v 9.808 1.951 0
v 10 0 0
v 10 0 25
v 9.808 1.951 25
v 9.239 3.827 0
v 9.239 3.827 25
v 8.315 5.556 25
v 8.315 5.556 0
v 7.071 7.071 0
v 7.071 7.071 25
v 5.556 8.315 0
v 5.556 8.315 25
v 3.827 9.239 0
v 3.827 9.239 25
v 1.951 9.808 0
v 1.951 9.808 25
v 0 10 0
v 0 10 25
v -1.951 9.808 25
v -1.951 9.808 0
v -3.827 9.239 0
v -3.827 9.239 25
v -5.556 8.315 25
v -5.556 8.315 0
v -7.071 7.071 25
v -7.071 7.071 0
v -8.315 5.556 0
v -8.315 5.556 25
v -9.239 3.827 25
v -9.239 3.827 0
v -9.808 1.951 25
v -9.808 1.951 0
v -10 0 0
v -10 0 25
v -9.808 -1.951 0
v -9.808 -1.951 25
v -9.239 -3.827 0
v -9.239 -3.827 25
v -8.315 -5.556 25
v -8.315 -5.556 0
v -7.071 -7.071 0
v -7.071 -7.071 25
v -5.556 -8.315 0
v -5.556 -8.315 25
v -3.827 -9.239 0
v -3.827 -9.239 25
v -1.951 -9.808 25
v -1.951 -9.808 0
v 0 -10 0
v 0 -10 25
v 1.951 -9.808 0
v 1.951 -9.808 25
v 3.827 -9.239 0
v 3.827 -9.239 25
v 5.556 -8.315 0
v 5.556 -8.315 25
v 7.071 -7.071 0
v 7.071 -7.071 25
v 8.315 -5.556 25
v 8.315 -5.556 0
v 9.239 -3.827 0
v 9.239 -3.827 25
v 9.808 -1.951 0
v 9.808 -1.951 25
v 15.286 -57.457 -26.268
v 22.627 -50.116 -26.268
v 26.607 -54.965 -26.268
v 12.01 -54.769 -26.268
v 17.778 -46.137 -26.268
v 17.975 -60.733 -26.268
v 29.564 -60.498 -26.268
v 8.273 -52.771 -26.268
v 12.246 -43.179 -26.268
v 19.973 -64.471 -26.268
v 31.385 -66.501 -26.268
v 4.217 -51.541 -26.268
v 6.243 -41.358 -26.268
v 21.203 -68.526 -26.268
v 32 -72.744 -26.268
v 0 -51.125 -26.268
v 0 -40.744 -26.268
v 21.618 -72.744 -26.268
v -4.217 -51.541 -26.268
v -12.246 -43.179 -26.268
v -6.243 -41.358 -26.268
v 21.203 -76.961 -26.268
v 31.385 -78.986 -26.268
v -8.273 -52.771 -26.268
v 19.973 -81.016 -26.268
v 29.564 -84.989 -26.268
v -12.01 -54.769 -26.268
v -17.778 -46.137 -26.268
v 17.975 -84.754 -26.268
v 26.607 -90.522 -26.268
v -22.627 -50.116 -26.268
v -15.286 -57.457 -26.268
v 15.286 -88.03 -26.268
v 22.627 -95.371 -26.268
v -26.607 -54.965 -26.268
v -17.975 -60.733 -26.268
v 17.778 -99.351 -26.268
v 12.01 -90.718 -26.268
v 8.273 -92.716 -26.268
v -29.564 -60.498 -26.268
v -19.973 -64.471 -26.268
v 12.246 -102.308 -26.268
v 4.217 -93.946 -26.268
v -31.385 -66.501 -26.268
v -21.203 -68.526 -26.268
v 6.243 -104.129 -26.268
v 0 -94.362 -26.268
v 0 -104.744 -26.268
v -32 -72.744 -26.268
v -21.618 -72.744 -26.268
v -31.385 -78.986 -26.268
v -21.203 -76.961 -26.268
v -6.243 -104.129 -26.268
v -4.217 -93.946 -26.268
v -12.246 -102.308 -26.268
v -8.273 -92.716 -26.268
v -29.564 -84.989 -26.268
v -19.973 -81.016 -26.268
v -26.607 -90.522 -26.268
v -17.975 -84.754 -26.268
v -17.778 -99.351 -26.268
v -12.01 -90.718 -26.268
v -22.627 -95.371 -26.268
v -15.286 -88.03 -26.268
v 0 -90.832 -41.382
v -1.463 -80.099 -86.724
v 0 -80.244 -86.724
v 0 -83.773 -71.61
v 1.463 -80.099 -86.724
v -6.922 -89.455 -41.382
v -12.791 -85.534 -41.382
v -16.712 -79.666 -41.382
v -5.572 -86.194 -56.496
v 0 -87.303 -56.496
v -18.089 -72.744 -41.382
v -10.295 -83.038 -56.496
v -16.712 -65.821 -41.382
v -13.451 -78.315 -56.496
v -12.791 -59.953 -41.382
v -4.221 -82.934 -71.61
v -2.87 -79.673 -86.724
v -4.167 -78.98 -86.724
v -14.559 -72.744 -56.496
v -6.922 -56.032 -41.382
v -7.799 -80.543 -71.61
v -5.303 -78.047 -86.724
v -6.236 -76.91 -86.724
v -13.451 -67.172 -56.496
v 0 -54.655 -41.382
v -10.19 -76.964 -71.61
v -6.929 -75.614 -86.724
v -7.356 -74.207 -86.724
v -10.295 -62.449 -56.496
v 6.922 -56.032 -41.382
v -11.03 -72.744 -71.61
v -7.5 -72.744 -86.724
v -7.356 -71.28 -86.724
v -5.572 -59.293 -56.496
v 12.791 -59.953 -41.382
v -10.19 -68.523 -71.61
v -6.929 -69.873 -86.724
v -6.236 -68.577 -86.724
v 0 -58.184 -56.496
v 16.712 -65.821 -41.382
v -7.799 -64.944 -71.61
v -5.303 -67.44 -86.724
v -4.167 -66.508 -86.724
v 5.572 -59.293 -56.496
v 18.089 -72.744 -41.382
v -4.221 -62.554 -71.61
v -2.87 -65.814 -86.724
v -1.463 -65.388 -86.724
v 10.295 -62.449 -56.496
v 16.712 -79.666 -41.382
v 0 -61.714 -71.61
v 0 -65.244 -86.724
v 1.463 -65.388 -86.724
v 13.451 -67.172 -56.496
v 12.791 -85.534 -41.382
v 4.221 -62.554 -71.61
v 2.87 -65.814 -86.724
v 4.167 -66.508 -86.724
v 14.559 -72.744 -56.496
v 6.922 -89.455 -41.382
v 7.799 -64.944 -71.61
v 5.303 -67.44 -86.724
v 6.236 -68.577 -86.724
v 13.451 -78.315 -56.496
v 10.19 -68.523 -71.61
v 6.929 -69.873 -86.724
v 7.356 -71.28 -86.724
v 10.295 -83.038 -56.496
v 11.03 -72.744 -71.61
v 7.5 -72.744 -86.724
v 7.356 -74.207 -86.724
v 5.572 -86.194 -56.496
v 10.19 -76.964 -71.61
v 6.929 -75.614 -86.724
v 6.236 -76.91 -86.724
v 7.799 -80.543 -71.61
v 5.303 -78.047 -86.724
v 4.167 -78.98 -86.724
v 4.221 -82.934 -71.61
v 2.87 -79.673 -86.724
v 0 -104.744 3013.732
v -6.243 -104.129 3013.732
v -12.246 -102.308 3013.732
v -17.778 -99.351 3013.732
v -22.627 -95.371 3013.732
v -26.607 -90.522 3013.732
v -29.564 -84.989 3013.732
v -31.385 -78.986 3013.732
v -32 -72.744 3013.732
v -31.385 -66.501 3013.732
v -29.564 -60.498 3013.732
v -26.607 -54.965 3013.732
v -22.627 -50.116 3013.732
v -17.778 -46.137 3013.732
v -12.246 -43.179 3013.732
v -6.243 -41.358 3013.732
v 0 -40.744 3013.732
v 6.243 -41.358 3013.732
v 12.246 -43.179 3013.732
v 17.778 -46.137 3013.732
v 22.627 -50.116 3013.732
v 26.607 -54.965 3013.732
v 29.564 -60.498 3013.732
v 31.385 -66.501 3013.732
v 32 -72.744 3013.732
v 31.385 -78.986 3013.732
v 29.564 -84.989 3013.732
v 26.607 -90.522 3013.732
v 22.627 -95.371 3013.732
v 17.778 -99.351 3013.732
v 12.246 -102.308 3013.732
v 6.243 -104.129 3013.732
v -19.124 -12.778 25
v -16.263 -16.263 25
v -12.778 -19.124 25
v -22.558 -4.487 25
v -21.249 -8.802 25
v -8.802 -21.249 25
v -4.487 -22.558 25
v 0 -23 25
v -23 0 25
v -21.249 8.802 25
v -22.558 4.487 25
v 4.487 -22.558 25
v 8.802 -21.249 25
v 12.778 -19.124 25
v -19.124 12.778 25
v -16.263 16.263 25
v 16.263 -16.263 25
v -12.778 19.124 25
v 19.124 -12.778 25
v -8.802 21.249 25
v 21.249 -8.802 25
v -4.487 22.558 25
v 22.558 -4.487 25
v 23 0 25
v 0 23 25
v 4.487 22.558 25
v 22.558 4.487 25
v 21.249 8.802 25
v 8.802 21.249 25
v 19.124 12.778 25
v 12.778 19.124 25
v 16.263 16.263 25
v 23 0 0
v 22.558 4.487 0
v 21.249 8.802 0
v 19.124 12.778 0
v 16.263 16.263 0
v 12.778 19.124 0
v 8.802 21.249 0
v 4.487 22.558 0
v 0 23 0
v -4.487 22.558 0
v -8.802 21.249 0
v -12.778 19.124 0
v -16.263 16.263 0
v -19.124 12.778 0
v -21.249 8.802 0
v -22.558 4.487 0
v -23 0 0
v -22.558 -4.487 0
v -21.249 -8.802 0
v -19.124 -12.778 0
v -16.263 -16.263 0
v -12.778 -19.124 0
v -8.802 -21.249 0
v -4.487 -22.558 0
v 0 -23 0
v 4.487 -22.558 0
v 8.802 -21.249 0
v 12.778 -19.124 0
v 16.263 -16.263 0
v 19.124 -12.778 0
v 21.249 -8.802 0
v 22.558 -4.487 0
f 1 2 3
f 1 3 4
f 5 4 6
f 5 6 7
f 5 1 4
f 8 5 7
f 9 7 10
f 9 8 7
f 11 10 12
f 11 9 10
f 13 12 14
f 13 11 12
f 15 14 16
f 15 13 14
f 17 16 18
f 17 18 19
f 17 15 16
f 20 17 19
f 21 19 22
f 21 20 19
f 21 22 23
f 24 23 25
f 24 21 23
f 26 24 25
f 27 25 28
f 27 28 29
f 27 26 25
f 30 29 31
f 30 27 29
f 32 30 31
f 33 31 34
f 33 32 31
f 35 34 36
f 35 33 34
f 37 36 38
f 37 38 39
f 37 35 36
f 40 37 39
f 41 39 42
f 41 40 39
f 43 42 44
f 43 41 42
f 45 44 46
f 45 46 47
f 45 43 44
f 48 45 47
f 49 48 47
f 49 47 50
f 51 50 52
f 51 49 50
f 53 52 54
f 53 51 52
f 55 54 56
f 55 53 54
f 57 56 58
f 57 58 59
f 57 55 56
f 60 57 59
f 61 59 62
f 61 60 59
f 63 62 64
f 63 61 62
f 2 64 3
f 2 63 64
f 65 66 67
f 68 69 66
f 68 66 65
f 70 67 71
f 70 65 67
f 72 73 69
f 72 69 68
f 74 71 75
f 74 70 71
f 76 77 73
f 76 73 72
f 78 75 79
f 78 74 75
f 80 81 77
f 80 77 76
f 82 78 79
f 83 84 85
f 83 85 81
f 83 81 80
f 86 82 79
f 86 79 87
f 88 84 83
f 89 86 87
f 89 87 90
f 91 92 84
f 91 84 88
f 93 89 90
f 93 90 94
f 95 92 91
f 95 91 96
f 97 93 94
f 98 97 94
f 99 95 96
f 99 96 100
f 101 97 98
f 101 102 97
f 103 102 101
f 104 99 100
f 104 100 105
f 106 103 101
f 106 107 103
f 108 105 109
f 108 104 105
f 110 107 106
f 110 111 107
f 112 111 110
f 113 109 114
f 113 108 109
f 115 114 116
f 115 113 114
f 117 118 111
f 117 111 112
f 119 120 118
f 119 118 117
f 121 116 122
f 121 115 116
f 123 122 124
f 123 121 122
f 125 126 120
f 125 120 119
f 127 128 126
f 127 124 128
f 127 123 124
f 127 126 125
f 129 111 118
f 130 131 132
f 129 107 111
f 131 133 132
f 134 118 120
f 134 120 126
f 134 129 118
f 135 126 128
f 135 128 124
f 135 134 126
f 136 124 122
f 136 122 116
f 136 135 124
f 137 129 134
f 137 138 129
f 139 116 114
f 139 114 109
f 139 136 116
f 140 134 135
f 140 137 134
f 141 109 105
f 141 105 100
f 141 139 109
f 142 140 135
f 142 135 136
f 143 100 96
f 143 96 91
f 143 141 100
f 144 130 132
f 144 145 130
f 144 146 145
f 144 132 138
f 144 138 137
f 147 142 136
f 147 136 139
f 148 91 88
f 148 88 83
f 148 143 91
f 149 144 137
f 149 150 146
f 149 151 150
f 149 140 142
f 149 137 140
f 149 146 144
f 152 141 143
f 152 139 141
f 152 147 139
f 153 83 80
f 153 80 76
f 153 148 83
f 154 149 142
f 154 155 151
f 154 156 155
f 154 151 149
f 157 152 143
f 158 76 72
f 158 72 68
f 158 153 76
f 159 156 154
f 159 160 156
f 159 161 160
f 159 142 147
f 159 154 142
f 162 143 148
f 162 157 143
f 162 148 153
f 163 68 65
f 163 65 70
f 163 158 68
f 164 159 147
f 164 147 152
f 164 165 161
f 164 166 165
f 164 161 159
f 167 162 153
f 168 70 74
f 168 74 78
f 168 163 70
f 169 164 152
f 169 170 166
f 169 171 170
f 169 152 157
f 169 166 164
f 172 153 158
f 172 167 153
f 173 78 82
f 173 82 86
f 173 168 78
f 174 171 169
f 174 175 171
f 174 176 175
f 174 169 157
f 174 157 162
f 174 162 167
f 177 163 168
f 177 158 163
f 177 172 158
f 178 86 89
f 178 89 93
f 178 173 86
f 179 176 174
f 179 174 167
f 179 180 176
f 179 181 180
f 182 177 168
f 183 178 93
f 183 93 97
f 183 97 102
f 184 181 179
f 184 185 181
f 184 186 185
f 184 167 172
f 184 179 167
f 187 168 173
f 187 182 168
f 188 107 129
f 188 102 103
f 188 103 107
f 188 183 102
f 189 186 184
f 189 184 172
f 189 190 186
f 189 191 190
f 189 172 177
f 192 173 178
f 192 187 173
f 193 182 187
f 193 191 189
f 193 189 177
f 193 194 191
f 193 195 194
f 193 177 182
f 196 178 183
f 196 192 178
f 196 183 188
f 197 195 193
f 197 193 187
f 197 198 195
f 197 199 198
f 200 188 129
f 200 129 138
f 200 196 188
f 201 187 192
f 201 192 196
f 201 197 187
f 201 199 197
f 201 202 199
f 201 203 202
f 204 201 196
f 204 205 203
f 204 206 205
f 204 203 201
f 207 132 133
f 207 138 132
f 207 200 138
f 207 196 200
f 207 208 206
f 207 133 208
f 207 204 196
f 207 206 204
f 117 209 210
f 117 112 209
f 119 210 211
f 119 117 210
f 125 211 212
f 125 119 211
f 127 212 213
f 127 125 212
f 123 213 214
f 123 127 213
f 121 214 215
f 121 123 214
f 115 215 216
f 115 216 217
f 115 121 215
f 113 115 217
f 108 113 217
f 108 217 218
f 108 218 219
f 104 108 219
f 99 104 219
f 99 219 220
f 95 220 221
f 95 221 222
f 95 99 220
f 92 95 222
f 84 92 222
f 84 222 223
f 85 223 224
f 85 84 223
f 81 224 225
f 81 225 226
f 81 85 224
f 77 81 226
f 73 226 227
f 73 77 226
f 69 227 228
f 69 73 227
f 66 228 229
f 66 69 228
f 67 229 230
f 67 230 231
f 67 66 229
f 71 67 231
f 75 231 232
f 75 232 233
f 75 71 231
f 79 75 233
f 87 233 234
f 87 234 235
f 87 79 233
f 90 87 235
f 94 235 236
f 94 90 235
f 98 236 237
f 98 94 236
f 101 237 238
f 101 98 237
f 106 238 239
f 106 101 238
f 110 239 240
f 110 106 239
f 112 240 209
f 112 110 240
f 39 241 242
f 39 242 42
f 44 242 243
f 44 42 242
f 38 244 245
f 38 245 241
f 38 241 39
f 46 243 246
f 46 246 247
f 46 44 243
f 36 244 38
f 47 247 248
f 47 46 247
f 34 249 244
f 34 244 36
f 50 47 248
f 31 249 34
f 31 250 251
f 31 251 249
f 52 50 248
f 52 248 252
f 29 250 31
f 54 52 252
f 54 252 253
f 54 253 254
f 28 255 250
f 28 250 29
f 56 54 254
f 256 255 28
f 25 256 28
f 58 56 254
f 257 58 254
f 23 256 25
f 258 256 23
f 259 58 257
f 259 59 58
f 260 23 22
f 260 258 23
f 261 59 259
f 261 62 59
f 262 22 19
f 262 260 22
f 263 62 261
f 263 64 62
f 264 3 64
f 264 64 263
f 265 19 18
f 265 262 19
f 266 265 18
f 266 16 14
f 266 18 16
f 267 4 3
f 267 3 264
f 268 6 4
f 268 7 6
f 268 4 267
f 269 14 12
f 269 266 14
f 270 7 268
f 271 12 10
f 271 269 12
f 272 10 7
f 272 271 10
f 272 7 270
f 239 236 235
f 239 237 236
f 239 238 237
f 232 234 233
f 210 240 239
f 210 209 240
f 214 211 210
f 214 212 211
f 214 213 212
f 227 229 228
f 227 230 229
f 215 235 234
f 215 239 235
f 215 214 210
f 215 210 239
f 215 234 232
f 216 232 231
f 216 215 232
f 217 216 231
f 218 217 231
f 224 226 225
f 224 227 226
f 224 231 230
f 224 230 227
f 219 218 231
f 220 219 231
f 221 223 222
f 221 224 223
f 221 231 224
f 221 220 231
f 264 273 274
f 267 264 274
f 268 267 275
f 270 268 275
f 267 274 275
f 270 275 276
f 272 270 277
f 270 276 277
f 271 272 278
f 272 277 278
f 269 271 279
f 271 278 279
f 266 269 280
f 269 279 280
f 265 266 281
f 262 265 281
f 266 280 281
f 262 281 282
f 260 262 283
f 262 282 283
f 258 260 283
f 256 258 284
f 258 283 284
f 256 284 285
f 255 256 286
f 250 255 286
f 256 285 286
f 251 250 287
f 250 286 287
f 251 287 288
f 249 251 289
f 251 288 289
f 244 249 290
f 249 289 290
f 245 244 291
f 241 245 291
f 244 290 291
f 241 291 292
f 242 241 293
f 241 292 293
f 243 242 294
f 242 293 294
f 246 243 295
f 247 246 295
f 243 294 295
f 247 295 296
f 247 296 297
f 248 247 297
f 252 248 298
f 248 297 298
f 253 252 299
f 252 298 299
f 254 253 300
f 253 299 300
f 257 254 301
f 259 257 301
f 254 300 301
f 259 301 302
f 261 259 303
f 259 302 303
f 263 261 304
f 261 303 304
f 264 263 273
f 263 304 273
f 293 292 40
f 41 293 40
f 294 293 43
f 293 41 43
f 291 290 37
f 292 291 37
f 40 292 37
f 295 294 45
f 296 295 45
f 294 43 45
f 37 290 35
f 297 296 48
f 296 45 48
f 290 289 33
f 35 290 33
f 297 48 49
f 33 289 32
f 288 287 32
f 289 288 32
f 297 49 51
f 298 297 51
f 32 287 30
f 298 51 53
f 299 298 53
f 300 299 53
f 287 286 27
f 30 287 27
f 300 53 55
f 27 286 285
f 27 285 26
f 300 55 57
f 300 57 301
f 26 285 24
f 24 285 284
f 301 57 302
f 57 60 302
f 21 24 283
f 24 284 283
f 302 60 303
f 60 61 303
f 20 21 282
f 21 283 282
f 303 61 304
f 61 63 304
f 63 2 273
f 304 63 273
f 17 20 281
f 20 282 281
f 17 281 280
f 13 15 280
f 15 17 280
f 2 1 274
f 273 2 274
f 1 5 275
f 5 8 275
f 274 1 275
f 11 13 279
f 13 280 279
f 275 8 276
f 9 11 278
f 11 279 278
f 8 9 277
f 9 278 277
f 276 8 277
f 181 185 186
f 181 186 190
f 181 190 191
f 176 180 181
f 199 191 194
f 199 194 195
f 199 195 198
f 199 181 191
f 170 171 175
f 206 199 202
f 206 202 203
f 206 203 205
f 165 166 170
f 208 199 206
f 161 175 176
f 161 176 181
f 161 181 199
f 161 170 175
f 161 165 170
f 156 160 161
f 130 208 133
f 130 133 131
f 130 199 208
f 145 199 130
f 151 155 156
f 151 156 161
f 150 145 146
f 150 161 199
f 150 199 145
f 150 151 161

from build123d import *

# Parameters (mm, degrees)
F0_R     = 23
F0_R_2   = 10
F1_DEPTH = 25


# Not quite as in the source:
# - a feature names something its author has since deleted; it is built from what else it names


with BuildPart() as f1:
    # F0 (on Top) → F1 (new body)
    with BuildSketch(Plane.XY):
        Circle(F0_R)
        Circle(F0_R_2, mode=Mode.SUBTRACT)
    extrude(amount=F1_DEPTH)


with BuildPart() as f3:
    # F2 (on Right) → F3 (revolve)
    with BuildSketch(Plane.YZ):
        Polygon((-72.7435579151, 3013.7323013039), (-104.7435579151, 3013.7323013039), (-104.7435579151, -26.2676986961), (-94.361692667, -26.2676986961), (-80.2435579151, -86.7242515087), (-72.7435579151, -86.7242515087), (-72.7435579151, -63.013613224), (-72.7435579151, -26.2676986961), align=None)
    revolve(axis=Axis((0, -72.7435579151, 1493.7323013039), (0, 0, -1)))


solid = Compound([f1.part, f3.part])
